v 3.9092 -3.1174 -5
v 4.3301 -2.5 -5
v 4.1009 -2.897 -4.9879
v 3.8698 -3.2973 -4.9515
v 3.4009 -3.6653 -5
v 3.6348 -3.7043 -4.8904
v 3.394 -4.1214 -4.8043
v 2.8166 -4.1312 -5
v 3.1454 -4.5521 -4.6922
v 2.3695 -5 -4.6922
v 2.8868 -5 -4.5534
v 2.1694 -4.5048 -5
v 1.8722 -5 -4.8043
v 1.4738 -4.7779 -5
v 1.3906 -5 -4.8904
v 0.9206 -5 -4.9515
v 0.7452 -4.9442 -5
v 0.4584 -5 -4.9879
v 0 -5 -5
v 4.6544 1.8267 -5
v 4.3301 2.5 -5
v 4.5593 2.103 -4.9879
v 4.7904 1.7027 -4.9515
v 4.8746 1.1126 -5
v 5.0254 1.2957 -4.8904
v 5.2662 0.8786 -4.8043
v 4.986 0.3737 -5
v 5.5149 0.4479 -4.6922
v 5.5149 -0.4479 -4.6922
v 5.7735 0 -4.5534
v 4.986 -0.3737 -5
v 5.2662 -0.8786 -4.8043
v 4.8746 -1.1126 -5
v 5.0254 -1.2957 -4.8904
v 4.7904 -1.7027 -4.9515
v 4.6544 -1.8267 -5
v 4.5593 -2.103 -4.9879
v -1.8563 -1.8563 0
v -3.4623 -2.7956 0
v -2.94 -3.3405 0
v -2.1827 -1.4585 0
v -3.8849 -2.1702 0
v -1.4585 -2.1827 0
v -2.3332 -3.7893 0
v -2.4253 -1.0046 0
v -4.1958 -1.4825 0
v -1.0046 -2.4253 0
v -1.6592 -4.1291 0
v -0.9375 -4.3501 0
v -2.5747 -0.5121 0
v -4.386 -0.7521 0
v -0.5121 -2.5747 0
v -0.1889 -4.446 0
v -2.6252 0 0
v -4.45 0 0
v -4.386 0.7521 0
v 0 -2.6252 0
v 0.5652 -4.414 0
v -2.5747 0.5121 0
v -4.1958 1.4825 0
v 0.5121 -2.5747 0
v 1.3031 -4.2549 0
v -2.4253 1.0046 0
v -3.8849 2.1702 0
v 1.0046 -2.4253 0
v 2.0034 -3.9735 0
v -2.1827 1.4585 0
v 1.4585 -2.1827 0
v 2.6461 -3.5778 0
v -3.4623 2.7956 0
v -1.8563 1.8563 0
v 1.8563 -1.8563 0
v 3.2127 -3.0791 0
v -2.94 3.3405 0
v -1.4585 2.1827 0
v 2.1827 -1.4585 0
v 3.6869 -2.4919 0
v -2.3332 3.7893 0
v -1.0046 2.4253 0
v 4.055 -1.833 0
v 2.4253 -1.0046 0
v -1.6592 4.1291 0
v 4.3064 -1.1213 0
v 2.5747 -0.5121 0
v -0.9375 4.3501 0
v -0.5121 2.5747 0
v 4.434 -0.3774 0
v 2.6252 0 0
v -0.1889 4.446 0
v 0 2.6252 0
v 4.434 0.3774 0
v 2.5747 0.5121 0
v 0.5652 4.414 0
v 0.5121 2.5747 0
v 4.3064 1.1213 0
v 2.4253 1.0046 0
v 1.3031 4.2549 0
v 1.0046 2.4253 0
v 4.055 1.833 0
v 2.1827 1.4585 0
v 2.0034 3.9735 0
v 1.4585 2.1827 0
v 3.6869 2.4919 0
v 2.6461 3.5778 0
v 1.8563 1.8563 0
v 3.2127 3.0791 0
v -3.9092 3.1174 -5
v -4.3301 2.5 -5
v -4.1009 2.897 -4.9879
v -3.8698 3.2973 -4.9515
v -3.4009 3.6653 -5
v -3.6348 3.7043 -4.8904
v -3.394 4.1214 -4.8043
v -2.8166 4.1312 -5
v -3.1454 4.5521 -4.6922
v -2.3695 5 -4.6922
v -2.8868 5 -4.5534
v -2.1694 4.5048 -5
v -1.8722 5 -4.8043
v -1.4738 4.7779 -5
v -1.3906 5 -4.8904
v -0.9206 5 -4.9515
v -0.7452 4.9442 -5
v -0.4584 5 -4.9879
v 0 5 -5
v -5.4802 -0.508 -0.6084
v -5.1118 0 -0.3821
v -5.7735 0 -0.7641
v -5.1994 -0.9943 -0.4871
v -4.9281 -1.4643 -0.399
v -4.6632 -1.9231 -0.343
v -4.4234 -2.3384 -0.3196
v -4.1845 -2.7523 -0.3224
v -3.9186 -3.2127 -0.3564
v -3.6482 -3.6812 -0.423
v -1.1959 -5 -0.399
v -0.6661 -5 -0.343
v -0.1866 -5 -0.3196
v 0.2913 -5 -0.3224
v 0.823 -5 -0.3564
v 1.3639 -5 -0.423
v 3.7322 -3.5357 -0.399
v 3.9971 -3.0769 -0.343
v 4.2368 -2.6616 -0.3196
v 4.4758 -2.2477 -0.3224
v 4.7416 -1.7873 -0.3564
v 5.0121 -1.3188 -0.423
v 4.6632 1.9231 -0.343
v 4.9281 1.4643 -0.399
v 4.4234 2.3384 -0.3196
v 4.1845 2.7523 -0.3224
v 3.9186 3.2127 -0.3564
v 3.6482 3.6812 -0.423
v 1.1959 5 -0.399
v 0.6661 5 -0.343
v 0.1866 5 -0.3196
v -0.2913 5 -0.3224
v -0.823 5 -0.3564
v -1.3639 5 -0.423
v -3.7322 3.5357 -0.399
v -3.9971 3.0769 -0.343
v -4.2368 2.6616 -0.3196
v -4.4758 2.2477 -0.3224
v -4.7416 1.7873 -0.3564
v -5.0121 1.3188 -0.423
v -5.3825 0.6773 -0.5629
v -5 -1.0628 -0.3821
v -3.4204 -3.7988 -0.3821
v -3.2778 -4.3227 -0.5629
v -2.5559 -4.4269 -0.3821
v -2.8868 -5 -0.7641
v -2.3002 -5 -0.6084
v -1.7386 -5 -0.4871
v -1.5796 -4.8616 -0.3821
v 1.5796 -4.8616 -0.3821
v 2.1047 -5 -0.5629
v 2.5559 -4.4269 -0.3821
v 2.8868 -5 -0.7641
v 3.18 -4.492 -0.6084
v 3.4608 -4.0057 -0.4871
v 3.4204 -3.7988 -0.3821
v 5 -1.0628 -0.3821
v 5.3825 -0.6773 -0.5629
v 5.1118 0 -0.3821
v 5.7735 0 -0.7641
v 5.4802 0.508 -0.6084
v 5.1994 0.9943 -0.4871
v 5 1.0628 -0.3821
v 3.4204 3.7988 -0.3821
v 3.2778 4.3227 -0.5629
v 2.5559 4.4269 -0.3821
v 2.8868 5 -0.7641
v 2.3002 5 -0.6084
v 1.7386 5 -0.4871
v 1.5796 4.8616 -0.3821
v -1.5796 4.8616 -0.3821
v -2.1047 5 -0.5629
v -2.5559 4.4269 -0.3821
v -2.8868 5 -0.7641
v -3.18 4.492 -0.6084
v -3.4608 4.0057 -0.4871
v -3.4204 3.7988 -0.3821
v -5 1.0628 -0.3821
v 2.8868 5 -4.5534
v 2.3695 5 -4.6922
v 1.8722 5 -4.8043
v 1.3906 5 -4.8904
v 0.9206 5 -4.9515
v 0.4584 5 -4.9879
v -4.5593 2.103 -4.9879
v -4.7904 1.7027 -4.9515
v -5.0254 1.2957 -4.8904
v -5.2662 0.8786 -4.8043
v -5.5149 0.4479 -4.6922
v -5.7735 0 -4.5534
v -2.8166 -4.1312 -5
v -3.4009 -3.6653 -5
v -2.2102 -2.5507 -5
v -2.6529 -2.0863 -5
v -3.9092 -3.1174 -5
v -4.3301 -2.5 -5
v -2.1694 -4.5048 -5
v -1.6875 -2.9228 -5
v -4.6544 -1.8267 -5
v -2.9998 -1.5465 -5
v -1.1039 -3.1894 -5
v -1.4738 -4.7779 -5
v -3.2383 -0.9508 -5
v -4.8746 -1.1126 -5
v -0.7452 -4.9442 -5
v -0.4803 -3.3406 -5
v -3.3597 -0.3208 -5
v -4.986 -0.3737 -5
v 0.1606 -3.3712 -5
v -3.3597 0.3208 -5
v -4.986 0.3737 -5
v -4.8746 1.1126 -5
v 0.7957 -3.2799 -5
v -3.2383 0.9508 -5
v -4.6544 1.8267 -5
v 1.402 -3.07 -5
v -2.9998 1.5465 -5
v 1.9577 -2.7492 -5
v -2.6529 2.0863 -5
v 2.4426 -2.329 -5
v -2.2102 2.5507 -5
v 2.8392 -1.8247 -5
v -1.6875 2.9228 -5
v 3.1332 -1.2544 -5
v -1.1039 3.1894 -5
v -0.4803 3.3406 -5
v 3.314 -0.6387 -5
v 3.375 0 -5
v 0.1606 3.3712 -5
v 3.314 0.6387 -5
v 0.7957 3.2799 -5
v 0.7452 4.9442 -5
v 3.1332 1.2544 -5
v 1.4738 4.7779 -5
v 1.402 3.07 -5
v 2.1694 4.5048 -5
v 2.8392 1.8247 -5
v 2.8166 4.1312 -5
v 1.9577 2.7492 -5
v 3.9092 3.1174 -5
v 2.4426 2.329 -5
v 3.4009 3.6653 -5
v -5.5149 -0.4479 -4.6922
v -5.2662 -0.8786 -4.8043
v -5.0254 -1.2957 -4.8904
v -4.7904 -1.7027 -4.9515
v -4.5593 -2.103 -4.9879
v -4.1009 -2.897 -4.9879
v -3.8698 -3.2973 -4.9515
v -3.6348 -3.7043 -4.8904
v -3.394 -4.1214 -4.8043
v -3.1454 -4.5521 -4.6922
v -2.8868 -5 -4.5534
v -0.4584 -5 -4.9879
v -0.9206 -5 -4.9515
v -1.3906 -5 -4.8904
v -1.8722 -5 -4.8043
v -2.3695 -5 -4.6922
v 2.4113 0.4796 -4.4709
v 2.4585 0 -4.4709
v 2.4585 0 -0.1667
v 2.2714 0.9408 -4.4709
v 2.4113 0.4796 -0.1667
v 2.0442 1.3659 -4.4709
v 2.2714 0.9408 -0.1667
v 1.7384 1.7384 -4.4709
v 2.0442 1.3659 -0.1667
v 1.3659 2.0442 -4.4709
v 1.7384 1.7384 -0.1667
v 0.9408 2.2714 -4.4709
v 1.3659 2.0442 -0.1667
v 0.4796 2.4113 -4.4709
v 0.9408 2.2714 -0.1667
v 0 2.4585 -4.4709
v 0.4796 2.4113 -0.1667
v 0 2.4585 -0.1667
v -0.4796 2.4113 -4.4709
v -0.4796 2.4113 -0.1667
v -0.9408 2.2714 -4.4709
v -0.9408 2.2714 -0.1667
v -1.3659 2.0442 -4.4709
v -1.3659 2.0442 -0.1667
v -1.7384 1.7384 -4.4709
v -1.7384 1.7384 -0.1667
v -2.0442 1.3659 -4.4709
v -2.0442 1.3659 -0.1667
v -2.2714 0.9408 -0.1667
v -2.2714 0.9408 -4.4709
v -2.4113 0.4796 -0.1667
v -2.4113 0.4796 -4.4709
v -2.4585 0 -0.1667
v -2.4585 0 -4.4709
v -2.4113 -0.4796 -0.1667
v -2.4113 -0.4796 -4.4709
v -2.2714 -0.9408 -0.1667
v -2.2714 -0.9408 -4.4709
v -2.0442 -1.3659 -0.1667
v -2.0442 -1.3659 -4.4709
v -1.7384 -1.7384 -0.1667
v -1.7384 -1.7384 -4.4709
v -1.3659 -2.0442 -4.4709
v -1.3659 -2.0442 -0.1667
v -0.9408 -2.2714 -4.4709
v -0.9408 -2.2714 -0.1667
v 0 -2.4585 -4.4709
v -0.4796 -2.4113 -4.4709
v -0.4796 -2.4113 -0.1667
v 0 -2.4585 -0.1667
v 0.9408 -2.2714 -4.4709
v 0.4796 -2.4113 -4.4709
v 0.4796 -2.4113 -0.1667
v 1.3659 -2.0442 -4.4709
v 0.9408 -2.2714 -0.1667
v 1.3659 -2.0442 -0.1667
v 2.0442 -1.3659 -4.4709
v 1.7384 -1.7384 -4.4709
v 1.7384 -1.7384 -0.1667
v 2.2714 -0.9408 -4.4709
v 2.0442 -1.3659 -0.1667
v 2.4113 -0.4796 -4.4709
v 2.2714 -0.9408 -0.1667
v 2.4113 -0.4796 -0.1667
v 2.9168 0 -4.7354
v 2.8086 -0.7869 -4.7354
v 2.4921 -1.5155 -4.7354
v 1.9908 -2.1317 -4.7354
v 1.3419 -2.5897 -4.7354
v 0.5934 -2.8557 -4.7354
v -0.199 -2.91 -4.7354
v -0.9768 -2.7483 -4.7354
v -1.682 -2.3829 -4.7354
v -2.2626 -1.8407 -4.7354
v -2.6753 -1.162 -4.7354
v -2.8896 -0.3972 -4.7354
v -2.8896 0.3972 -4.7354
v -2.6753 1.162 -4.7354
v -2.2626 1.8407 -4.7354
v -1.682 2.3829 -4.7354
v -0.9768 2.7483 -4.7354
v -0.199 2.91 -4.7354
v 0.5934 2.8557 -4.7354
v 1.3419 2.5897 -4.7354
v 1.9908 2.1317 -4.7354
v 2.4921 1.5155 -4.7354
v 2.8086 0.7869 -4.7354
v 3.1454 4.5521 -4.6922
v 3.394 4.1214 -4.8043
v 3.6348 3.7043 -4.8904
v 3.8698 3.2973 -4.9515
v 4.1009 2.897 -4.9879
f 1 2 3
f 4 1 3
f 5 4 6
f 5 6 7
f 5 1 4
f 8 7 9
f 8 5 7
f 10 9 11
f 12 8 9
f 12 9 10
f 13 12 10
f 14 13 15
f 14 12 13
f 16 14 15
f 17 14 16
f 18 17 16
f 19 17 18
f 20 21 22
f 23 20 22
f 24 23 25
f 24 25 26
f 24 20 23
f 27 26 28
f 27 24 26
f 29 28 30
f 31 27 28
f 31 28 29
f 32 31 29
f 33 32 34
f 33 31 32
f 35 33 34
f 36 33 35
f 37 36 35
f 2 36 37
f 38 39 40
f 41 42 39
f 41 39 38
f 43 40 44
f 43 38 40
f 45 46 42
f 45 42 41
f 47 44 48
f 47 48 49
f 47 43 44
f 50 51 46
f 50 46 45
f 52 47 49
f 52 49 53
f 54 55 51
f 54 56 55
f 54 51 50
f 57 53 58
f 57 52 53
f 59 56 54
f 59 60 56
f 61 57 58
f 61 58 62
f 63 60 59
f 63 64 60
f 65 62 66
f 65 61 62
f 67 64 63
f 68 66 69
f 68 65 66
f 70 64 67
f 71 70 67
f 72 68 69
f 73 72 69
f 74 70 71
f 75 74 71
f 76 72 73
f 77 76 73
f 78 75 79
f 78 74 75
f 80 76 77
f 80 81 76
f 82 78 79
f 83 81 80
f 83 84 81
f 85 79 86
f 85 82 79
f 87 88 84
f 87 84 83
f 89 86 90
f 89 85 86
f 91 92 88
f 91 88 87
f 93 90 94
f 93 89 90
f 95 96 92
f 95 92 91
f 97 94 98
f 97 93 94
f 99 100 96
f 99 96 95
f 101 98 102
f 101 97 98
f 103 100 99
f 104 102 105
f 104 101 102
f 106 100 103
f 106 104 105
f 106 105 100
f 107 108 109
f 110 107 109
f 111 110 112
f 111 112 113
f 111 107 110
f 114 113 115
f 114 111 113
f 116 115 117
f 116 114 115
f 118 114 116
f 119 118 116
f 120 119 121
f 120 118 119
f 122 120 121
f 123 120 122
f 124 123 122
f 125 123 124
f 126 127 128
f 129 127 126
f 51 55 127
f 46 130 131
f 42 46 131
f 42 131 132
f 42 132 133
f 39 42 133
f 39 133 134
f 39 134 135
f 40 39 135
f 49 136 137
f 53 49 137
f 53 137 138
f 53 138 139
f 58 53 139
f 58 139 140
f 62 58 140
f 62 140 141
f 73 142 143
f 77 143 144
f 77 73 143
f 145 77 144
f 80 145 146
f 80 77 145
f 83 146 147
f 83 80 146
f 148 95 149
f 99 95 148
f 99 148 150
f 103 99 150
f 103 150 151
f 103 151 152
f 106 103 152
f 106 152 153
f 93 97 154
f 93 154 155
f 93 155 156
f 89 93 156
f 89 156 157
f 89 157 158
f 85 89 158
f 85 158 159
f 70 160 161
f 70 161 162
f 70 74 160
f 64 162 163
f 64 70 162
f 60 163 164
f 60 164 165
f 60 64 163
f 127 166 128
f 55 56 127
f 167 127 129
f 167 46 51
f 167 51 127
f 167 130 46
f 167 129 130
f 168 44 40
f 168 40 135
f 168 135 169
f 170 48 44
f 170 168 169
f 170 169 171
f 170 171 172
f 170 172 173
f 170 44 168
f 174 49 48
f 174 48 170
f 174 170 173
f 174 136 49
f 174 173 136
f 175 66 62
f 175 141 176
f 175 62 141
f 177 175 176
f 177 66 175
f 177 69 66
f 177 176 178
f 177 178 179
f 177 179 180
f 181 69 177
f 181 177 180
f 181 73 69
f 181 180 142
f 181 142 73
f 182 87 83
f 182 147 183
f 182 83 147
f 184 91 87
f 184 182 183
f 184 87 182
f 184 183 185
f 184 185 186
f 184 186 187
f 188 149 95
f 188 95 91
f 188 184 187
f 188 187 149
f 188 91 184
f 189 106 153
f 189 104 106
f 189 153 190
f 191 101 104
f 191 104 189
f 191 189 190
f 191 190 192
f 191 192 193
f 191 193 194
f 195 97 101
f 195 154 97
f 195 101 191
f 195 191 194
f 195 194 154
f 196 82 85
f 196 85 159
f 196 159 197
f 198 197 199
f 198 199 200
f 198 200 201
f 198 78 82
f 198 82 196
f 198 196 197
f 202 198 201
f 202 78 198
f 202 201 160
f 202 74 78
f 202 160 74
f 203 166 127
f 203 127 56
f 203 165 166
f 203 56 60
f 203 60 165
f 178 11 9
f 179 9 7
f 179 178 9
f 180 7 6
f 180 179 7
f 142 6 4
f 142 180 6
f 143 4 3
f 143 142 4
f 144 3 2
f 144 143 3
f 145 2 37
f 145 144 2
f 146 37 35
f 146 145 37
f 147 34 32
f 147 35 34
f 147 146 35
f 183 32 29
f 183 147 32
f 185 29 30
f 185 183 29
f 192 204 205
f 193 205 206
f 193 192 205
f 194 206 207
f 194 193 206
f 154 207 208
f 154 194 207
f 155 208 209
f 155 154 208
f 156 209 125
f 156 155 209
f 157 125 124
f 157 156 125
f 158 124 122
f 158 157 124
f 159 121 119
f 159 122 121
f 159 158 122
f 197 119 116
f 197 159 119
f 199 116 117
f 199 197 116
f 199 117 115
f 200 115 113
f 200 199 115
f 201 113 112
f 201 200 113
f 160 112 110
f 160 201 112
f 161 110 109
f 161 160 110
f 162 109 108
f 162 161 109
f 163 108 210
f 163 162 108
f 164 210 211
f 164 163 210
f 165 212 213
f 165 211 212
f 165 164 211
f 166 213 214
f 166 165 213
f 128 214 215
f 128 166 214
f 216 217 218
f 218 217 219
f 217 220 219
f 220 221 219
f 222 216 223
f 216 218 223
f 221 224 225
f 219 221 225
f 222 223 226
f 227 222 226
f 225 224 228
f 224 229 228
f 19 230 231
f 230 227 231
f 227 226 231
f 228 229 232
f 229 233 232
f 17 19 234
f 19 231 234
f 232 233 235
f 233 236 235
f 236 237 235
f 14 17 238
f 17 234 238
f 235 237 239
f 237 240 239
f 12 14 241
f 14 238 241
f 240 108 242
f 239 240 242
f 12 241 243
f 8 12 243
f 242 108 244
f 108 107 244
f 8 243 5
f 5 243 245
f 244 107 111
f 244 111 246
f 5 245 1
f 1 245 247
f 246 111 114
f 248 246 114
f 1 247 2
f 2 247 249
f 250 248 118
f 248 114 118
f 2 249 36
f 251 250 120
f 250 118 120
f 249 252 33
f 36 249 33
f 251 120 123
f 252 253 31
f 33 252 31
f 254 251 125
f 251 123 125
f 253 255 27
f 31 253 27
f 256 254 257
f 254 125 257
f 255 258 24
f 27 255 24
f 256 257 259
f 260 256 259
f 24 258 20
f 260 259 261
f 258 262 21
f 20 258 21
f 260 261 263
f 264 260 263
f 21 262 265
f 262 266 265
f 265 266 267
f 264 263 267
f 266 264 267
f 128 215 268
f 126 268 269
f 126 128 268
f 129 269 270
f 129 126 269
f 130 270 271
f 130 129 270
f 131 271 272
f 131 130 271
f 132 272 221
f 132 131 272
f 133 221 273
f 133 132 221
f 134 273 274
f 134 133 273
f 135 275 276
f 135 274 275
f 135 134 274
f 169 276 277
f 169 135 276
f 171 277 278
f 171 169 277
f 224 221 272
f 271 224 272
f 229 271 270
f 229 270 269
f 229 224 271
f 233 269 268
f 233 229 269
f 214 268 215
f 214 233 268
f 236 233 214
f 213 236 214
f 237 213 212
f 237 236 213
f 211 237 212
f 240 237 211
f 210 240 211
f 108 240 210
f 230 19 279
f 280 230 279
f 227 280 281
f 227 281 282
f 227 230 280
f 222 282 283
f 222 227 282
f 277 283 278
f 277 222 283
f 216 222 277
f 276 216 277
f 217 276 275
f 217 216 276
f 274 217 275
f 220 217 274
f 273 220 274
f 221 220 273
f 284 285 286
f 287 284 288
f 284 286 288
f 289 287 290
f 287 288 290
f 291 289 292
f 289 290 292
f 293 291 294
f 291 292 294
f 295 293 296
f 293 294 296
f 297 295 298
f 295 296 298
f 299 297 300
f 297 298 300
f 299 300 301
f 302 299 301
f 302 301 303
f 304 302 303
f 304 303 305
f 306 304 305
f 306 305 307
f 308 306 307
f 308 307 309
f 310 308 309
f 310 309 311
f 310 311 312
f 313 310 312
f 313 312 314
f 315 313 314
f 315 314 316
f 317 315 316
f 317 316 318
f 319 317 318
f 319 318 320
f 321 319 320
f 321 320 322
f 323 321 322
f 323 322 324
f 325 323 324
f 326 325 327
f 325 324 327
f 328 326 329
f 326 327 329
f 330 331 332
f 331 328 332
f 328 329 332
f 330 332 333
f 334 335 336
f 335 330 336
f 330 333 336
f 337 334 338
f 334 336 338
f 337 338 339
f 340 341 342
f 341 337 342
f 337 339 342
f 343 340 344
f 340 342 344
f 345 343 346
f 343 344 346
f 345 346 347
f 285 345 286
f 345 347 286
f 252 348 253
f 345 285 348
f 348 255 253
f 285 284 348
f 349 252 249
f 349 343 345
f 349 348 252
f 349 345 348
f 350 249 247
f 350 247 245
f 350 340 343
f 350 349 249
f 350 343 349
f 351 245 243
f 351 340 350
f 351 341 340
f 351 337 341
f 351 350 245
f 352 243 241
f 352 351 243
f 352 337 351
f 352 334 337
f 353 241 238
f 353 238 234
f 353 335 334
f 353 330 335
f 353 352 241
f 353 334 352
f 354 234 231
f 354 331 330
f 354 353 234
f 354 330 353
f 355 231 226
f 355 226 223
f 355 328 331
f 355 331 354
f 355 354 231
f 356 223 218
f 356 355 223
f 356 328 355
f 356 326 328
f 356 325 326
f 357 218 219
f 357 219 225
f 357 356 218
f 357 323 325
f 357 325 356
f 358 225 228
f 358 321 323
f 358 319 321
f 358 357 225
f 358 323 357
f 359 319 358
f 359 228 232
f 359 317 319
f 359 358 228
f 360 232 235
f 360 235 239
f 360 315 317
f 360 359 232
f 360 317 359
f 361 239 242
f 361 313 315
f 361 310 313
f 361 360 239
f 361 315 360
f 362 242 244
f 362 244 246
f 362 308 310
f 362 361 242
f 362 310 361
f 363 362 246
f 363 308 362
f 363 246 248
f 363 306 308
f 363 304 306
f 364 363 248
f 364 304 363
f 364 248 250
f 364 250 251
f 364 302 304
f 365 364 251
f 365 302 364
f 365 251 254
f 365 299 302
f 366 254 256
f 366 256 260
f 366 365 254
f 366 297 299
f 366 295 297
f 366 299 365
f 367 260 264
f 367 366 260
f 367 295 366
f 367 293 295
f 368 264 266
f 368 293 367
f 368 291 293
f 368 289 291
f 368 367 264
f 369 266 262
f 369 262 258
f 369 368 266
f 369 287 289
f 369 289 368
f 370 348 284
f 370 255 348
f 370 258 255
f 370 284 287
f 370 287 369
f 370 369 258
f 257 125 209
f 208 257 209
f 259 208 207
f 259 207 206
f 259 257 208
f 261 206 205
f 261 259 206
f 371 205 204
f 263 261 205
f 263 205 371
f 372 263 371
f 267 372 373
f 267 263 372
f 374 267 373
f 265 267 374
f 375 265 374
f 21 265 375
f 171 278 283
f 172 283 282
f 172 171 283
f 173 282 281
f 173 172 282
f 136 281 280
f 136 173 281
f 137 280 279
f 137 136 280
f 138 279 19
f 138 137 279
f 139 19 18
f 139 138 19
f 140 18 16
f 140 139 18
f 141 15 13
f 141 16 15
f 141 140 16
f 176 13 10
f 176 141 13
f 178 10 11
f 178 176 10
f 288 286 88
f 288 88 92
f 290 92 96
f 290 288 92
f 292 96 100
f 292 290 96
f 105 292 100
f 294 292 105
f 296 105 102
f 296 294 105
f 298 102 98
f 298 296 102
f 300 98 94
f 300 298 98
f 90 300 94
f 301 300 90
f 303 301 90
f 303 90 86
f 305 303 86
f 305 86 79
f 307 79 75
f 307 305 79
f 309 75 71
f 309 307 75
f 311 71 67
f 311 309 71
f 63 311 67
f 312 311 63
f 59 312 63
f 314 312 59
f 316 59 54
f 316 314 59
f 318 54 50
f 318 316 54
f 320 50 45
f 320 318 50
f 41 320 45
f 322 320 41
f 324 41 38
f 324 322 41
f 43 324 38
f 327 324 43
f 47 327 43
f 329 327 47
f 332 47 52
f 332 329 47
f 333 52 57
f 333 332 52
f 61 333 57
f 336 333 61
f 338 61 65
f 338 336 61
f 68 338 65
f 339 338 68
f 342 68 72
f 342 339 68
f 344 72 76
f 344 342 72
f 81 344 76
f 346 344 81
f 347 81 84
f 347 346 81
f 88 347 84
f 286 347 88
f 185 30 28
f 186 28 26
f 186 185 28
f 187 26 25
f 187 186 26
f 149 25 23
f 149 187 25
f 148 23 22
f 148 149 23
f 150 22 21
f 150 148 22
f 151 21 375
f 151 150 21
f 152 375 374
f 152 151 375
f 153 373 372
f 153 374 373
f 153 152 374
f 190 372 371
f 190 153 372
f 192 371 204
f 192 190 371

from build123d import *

# Parameters (mm, degrees)
SKETCH1_R        = 2.4585
BASENUT_DEPTH    = 5
ENDCHAMFER2_SIZE = 0.166666667


with BuildPart() as part:
    # Sketch1 → BaseNut (new body)
    with BuildSketch(Plane.XY):
        Polygon((2.886751346, -5), (5.773502692, 0), (2.886751346, 5), (-2.886751346, 5), (-5.773502692, 0), (-2.886751346, -5), align=None)
        Circle(SKETCH1_R, mode=Mode.SUBTRACT)
    extrude(amount=-BASENUT_DEPTH)

    # Sketch2 → Chamfer1 (revolve, cut)
    with BuildSketch(Plane(origin=(15.04811501, 0, -16.706149795), x_dir=(0, 0, -1), z_dir=(0, 1, 0))):
        Polygon((-12.152731783, 20.821617702), (-11.706149795, 20.04811501), (-11.706149795, 20.821617702), align=None)
    revolve(axis=Axis((0, 0, 7.016501752), (0, 0, -1)), mode=Mode.SUBTRACT)

    # Sketch6 → EndChamfer1 (revolve, cut)
    with BuildSketch(Plane(origin=(-9.197458863, 0, -10.252541137), x_dir=(0, 0, 1), z_dir=(0, 1, 0))):
        Polygon((5.252541137, 11.655958863), (5.252541137, 12.572458863), (5.781682659, 11.655958863), align=None)
    revolve(axis=Axis((0, 0, 13.104863586), (0, 0, -1)), mode=Mode.SUBTRACT)

    # Sketch5 → Chamfer2 (revolve, cut)
    with BuildSketch(Plane(origin=(-14.793032735, 0, -16.96123207), x_dir=(0, 0, 1), z_dir=(0, 1, 0)), mode=Mode.PRIVATE) as chamfer2_sk:
        Polygon((16.96123207, 19.243032735), (16.96123207, 20.566535427), (16.197107435, 20.566535427), align=None)
    revolve(chamfer2_sk.sketch.rotate(Axis((0, 0, -39.536013381), (0, 0, 1)), 180), axis=Axis((0, 0, -39.536013381), (0, 0, 1)), mode=Mode.SUBTRACT)

    # EndChamfer2
    endchamfer2_edges = [part.edges().sort_by_distance(p)[0] for p in [
        (-2.4585, 0, 0),
    ]]
    chamfer(endchamfer2_edges, length=ENDCHAMFER2_SIZE)


solid = part.part
